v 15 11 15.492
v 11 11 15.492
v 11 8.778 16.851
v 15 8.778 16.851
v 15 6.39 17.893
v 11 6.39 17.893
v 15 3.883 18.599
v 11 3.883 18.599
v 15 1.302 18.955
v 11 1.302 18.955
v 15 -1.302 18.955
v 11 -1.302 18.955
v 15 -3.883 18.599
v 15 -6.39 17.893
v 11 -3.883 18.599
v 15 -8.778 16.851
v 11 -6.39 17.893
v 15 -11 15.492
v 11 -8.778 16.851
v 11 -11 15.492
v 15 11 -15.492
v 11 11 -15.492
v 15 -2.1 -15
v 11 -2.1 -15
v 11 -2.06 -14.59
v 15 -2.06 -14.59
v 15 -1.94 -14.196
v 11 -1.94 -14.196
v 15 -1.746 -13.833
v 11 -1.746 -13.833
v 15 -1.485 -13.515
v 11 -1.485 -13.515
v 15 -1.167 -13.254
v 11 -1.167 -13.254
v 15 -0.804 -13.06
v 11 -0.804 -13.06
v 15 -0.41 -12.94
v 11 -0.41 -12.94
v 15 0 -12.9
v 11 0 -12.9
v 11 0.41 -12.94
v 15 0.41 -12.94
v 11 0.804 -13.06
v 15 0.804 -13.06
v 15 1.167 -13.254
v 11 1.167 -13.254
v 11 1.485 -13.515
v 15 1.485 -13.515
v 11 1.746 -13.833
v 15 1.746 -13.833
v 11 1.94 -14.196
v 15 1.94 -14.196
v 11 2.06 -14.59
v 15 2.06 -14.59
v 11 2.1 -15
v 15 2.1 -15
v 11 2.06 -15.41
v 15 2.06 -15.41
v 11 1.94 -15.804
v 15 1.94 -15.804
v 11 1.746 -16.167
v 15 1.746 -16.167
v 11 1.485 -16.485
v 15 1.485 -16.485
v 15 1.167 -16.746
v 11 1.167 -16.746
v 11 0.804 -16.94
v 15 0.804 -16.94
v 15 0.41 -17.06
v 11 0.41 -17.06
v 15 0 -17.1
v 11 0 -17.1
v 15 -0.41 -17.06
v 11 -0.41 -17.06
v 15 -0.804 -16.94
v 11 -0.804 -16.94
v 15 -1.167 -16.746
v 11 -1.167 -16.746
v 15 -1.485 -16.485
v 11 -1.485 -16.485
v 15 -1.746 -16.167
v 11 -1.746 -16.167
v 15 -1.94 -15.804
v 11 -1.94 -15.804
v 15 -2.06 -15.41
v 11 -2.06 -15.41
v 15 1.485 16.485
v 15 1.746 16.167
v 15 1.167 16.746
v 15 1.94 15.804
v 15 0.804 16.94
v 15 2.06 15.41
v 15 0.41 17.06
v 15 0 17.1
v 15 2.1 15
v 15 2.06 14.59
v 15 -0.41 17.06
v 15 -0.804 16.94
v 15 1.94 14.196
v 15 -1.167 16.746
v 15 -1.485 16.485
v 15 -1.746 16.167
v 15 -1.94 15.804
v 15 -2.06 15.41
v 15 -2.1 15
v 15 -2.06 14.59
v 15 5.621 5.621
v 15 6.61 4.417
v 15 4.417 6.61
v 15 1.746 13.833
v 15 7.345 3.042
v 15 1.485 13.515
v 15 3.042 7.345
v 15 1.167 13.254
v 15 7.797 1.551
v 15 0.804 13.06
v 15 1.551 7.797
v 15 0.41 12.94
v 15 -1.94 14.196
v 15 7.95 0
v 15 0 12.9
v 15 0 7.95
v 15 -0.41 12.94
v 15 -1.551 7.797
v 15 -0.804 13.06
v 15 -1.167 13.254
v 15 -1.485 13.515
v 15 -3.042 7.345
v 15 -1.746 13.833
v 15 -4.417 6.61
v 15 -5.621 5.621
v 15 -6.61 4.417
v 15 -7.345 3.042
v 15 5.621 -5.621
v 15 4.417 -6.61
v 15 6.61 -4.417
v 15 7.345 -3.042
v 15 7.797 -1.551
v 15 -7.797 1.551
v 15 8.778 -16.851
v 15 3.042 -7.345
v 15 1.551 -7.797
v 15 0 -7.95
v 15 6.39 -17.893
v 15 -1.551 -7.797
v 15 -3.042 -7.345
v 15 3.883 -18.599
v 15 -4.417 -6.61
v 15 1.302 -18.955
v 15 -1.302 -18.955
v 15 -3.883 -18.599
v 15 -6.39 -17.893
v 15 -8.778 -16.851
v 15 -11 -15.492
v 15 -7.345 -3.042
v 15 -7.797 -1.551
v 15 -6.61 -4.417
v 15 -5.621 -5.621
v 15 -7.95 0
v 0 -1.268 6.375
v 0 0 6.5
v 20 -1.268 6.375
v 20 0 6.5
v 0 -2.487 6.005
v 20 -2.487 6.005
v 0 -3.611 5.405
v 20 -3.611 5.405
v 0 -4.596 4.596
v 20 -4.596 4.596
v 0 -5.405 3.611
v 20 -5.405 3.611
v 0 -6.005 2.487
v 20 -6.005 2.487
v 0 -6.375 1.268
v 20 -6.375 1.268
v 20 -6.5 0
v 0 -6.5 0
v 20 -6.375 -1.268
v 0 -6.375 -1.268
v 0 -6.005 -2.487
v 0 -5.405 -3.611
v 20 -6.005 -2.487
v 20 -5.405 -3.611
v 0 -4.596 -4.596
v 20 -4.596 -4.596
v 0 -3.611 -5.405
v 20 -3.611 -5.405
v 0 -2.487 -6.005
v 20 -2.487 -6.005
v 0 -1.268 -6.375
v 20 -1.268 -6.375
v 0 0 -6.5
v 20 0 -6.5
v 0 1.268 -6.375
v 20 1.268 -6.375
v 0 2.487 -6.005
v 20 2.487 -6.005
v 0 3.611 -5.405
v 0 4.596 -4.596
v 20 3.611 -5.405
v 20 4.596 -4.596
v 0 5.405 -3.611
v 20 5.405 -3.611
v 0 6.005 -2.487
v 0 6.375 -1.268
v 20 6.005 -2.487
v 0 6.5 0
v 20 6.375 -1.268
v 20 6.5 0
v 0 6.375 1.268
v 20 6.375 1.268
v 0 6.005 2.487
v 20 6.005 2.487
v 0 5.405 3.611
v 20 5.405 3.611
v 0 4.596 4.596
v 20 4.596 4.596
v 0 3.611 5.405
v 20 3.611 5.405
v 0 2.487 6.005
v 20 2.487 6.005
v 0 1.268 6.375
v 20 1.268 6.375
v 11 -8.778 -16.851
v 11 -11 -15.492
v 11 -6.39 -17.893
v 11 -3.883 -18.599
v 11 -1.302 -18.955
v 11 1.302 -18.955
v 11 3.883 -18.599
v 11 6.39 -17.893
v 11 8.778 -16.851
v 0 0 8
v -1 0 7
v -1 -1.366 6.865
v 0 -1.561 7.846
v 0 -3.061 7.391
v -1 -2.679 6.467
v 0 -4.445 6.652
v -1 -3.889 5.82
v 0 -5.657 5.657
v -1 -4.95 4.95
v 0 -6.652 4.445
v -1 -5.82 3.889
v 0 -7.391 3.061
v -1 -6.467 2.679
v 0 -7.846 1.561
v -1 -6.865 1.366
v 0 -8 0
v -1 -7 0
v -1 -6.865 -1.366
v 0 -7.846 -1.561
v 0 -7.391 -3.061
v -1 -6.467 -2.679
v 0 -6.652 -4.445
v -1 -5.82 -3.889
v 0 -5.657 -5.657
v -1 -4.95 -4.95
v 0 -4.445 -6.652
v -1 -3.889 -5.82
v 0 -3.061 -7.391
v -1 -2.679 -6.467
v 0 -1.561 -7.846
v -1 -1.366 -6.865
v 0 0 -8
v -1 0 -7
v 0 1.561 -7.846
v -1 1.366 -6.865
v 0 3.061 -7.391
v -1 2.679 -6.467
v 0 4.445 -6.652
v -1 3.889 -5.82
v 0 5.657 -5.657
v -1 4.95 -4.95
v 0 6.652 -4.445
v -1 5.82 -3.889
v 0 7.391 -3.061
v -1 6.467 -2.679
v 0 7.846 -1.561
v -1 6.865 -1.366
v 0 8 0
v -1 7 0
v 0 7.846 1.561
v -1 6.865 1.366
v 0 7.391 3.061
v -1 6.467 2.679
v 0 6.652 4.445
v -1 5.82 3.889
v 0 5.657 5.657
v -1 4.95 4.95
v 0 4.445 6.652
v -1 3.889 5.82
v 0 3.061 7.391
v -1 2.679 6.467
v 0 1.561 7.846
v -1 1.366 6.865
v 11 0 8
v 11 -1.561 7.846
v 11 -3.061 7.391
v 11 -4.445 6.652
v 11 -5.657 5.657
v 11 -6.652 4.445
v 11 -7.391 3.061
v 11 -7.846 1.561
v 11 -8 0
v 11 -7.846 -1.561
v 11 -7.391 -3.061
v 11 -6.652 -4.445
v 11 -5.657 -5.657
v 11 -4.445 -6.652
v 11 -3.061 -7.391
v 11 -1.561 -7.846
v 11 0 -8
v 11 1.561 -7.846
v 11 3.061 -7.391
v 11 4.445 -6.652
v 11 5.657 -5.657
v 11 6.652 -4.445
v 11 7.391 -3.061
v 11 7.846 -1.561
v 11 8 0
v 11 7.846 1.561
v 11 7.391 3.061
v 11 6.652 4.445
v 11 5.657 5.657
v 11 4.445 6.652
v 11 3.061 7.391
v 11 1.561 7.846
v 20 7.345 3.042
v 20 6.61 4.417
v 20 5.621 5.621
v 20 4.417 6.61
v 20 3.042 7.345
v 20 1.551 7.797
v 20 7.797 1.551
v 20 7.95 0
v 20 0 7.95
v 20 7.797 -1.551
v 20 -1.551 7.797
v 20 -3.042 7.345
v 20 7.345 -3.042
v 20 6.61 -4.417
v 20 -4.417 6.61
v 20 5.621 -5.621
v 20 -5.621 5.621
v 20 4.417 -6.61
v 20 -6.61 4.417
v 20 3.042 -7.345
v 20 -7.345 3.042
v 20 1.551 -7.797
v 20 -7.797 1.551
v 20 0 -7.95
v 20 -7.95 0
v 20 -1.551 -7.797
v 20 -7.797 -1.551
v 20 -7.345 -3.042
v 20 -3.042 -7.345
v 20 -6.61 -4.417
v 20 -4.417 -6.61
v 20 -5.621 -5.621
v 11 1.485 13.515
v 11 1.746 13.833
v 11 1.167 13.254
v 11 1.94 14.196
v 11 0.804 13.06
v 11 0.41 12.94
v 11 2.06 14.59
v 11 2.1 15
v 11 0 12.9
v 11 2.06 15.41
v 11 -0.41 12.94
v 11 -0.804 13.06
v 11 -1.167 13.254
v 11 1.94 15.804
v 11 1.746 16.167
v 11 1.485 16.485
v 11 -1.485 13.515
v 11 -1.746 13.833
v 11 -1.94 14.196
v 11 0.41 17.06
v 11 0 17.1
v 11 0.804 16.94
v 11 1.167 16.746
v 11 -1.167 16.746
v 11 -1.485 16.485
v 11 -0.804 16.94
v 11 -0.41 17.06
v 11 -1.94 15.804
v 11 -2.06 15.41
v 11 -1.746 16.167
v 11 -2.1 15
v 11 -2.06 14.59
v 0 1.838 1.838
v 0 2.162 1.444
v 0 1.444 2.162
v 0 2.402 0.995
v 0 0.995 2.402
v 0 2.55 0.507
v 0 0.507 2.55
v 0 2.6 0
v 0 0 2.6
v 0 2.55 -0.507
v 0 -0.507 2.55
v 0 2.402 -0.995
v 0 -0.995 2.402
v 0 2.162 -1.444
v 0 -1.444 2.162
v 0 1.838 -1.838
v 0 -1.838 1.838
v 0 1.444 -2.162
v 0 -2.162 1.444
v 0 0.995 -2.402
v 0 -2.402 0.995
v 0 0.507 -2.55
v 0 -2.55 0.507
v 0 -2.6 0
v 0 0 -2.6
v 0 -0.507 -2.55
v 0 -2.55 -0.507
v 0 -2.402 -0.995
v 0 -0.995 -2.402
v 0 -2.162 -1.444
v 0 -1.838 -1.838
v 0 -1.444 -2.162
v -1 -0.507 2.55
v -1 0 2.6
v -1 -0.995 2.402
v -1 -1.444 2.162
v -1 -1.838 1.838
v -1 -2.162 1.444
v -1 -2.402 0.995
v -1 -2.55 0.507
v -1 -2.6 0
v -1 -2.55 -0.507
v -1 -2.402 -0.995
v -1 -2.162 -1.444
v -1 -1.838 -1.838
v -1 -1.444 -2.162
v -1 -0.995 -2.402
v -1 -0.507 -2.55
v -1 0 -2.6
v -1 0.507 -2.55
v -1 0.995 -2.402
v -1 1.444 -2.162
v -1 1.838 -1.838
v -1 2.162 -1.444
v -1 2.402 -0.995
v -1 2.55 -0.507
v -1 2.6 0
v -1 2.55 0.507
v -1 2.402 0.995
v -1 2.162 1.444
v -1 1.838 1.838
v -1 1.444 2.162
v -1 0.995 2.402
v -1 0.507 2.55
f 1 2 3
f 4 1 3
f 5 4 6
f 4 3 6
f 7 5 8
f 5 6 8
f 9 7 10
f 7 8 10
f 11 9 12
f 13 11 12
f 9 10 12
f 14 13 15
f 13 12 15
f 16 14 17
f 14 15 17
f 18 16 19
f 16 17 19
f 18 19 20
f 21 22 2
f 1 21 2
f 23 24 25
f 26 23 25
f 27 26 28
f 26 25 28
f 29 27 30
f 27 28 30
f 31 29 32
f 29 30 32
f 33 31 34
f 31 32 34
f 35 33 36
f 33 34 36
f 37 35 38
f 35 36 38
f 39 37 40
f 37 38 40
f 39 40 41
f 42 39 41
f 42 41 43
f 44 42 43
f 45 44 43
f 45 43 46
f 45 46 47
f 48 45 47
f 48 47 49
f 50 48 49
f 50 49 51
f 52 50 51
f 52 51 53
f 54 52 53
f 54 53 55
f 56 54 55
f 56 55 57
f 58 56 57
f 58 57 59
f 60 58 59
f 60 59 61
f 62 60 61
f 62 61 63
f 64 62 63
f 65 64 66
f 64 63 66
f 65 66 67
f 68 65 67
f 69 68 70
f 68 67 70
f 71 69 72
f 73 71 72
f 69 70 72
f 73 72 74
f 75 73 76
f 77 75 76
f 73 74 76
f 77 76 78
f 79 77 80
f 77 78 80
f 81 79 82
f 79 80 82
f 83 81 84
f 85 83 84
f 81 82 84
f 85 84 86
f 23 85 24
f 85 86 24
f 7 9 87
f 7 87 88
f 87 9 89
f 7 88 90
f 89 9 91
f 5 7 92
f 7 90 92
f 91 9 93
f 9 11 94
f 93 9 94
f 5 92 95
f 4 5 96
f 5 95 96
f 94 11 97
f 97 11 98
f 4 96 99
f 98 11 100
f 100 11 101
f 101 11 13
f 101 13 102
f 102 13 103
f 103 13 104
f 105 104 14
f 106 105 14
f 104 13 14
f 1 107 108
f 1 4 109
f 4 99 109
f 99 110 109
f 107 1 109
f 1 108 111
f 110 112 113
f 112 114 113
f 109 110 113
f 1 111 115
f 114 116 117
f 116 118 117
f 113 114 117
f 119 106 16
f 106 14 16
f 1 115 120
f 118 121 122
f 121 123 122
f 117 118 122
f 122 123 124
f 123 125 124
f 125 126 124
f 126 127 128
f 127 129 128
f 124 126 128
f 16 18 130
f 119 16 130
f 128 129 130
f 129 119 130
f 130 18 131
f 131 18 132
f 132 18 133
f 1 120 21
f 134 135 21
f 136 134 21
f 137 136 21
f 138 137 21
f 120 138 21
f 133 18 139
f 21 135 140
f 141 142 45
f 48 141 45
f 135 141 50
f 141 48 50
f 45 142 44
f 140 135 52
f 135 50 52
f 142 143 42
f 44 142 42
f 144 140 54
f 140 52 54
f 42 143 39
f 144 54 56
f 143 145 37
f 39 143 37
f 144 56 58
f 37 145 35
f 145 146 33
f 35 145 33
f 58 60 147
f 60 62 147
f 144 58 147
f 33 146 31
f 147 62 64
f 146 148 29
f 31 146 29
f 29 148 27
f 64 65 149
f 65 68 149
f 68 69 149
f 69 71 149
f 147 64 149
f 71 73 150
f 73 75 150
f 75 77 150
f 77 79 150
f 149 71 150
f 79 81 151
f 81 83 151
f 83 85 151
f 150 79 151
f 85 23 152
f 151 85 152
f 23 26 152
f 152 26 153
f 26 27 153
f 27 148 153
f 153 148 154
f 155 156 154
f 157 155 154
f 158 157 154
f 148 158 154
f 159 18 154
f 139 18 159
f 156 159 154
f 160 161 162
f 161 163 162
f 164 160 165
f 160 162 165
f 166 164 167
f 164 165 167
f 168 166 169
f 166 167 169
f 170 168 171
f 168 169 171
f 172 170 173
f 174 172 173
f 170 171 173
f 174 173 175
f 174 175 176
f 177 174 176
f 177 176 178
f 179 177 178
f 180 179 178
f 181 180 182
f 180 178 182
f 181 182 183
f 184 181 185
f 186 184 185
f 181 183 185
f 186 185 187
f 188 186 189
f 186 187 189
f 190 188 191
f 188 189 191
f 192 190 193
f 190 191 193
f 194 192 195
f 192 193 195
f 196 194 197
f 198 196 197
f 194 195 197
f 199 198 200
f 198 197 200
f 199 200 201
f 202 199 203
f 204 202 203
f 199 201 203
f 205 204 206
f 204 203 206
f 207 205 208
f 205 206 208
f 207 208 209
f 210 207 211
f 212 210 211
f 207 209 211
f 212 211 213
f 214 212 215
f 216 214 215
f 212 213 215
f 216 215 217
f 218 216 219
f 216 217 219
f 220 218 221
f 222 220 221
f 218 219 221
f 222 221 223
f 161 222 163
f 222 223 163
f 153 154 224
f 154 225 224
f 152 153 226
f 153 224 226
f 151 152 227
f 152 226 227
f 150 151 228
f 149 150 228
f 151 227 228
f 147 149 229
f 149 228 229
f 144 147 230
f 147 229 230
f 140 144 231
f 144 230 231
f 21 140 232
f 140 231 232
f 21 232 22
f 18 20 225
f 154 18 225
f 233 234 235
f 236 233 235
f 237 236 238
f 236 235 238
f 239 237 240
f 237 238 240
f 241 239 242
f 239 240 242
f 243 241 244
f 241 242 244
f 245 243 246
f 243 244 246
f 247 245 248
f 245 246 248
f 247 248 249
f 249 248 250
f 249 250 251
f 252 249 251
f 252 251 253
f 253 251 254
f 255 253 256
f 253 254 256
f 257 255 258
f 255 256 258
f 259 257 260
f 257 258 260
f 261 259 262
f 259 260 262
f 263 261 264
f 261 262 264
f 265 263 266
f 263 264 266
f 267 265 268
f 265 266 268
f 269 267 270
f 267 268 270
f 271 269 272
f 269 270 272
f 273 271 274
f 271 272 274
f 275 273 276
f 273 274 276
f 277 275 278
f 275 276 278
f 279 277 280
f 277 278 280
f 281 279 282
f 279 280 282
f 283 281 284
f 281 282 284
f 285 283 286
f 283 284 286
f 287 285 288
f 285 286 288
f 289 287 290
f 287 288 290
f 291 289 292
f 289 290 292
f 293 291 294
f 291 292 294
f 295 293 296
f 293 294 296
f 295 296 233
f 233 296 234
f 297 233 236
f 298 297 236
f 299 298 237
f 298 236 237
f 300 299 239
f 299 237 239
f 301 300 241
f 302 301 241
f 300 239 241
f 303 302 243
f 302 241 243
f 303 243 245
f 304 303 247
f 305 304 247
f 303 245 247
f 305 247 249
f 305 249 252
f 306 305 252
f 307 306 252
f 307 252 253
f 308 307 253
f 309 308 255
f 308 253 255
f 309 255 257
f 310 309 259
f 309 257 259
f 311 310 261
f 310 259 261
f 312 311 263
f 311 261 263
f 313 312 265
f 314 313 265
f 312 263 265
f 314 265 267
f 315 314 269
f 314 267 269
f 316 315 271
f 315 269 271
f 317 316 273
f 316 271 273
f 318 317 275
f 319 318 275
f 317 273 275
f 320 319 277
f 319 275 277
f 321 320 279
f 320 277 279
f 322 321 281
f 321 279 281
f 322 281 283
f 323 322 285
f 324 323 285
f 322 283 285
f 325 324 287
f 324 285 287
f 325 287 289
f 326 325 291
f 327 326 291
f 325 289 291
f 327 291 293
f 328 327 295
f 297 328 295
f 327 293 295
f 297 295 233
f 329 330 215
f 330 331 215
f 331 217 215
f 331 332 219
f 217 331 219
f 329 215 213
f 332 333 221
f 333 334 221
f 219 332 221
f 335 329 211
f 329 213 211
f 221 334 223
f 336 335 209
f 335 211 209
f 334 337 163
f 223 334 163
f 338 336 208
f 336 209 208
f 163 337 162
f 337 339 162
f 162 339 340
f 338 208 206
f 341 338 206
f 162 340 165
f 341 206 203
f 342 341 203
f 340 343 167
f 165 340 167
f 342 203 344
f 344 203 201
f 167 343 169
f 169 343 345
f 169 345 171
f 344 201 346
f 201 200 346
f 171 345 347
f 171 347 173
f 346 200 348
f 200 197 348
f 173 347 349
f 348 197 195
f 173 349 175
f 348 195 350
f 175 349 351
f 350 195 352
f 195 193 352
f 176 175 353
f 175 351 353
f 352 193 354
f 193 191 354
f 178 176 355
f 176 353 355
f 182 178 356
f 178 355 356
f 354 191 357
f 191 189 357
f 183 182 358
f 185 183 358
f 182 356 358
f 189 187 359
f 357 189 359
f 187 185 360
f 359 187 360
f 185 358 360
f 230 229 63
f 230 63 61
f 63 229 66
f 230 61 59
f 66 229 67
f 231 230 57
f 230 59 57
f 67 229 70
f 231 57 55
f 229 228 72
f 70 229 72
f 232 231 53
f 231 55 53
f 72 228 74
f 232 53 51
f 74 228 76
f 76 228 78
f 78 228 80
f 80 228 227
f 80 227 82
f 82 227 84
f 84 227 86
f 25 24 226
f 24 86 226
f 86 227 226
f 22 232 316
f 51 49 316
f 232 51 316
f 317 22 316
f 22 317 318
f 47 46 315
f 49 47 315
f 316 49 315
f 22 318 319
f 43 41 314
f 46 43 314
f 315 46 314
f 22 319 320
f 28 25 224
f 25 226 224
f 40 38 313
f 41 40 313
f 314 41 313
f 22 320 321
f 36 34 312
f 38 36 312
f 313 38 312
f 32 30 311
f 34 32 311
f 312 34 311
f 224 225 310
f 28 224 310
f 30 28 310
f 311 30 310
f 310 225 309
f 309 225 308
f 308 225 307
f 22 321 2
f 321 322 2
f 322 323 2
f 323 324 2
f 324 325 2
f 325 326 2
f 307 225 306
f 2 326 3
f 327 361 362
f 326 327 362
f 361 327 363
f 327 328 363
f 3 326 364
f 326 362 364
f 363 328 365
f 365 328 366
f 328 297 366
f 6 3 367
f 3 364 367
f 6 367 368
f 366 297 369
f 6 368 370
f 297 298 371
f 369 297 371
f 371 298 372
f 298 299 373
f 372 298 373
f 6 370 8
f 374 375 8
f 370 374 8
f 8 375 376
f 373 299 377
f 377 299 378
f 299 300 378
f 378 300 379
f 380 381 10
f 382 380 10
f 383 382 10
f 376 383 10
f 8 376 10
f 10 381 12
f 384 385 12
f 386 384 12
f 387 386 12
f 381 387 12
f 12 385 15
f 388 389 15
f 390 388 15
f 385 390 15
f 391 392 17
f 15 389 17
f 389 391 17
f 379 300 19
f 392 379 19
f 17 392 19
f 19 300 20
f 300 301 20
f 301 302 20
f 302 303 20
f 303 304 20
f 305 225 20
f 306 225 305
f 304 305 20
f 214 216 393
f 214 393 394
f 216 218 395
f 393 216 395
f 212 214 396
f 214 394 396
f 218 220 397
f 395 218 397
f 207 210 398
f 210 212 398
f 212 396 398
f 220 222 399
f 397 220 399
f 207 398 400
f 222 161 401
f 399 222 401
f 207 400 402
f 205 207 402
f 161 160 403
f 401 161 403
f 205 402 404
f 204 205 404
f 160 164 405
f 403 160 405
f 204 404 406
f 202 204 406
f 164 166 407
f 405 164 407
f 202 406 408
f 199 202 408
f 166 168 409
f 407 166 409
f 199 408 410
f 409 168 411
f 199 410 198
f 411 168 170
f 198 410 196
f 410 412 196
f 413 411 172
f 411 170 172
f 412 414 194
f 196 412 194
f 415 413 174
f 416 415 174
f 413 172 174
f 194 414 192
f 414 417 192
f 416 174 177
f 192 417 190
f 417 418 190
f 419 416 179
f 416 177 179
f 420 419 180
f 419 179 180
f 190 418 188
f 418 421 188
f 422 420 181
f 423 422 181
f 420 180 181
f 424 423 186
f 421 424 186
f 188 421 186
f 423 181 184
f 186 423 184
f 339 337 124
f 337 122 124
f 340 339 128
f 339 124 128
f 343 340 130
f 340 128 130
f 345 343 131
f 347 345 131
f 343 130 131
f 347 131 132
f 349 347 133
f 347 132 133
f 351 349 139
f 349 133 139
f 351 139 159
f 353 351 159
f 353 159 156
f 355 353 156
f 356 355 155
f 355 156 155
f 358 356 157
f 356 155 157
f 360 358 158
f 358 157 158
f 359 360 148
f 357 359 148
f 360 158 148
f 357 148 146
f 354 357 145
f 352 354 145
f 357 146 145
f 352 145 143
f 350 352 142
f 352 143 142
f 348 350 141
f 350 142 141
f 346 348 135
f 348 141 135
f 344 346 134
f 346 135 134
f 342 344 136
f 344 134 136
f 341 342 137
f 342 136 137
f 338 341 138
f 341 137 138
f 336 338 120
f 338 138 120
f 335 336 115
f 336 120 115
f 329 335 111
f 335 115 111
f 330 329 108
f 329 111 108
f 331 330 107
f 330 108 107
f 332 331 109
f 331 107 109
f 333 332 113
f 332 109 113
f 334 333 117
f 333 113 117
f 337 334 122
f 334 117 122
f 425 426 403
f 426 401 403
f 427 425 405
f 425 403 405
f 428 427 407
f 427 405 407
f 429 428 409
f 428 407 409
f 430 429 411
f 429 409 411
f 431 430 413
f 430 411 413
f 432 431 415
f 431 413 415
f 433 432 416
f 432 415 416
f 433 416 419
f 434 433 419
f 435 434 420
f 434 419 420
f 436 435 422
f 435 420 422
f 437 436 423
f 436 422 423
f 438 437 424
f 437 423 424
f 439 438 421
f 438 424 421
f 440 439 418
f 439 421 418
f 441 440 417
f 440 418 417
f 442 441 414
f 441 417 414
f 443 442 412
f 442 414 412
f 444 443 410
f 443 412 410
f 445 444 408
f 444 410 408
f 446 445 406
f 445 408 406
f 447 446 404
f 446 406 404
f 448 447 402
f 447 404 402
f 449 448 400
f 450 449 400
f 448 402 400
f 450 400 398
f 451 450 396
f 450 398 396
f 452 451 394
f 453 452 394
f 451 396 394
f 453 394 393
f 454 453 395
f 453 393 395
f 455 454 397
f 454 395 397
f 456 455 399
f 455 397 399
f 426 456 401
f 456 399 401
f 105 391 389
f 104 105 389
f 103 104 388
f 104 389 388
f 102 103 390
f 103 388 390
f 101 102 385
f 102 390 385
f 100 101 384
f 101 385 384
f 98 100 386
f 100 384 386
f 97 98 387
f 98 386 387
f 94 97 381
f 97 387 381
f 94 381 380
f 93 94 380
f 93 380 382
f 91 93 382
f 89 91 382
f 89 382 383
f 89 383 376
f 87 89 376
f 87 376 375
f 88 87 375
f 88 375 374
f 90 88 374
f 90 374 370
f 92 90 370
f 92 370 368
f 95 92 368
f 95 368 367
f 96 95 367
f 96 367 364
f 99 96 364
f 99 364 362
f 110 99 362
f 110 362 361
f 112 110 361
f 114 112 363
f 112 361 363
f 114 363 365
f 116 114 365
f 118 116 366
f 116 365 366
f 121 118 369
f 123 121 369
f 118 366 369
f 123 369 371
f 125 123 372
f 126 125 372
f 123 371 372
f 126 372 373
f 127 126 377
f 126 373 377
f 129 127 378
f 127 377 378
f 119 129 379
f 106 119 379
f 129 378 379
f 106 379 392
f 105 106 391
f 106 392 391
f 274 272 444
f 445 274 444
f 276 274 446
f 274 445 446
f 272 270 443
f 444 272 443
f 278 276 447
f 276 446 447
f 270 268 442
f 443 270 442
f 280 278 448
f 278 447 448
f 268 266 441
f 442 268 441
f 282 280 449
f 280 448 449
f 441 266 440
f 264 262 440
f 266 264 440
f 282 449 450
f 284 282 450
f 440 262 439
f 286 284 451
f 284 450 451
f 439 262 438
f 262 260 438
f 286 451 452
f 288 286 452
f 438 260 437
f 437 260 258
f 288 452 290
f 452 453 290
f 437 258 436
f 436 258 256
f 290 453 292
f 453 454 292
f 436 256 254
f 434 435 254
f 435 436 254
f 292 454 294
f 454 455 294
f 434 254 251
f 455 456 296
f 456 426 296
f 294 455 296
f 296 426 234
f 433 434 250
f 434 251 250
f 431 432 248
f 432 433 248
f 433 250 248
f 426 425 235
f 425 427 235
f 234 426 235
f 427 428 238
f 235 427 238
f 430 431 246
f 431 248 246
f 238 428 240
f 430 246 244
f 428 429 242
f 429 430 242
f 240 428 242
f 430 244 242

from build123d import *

# Parameters (mm, degrees)
F2_R     = 2.1
F3_DEPTH = 9.001
F4_SIZE  = 1


# Not quite as in the source:
# - a feature names something its author has since deleted; it is built from what else it names


with BuildPart() as f1:
    # F0 (on Front) → F1 (revolve)
    with BuildSketch(Plane.XZ):
        Polygon((0, 6.5), (20, 6.5), (20, 7.95), (15, 7.95), (15, 19), (11, 19), (11, 8), (-1, 8), (-1, 2.6), (0, 2.6), align=None)
    revolve(axis=Axis((12.5816260299, 0, 0), (1, 0, 0)))

    # F2 (on face) → F3 (cut, through all)
    with BuildSketch(Plane(origin=(11, 0, 0), x_dir=(0, -1, 0), z_dir=(-1, 0, 0))):
        with Locations((0, 15)):
            Circle(F2_R)
        with Locations((0, -15)):
            Circle(F2_R)
        with BuildLine():
            Line((-11, -15.4919333848), (-11, 15.4919333848))
            ThreePointArc((-11, 15.4919333848), (-19, 0), (-11, -15.4919333848))
        make_face()
        with BuildLine():
            ThreePointArc((19, 0), (16.8819430161, 8.7177978871), (11, 15.4919333848))
            Line((11, 15.4919333848), (11, -15.4919333848))
            ThreePointArc((11, -15.4919333848), (16.8819430161, -8.7177978871), (19, 0))
        make_face()
    extrude(amount=-F3_DEPTH, mode=Mode.SUBTRACT)

    # F4
    f4_edges = [f1.edges().sort_by_distance(p)[0] for p in [
        (-1, 0, -8),
    ]]
    chamfer(f4_edges, length=F4_SIZE)


solid = f1.part
